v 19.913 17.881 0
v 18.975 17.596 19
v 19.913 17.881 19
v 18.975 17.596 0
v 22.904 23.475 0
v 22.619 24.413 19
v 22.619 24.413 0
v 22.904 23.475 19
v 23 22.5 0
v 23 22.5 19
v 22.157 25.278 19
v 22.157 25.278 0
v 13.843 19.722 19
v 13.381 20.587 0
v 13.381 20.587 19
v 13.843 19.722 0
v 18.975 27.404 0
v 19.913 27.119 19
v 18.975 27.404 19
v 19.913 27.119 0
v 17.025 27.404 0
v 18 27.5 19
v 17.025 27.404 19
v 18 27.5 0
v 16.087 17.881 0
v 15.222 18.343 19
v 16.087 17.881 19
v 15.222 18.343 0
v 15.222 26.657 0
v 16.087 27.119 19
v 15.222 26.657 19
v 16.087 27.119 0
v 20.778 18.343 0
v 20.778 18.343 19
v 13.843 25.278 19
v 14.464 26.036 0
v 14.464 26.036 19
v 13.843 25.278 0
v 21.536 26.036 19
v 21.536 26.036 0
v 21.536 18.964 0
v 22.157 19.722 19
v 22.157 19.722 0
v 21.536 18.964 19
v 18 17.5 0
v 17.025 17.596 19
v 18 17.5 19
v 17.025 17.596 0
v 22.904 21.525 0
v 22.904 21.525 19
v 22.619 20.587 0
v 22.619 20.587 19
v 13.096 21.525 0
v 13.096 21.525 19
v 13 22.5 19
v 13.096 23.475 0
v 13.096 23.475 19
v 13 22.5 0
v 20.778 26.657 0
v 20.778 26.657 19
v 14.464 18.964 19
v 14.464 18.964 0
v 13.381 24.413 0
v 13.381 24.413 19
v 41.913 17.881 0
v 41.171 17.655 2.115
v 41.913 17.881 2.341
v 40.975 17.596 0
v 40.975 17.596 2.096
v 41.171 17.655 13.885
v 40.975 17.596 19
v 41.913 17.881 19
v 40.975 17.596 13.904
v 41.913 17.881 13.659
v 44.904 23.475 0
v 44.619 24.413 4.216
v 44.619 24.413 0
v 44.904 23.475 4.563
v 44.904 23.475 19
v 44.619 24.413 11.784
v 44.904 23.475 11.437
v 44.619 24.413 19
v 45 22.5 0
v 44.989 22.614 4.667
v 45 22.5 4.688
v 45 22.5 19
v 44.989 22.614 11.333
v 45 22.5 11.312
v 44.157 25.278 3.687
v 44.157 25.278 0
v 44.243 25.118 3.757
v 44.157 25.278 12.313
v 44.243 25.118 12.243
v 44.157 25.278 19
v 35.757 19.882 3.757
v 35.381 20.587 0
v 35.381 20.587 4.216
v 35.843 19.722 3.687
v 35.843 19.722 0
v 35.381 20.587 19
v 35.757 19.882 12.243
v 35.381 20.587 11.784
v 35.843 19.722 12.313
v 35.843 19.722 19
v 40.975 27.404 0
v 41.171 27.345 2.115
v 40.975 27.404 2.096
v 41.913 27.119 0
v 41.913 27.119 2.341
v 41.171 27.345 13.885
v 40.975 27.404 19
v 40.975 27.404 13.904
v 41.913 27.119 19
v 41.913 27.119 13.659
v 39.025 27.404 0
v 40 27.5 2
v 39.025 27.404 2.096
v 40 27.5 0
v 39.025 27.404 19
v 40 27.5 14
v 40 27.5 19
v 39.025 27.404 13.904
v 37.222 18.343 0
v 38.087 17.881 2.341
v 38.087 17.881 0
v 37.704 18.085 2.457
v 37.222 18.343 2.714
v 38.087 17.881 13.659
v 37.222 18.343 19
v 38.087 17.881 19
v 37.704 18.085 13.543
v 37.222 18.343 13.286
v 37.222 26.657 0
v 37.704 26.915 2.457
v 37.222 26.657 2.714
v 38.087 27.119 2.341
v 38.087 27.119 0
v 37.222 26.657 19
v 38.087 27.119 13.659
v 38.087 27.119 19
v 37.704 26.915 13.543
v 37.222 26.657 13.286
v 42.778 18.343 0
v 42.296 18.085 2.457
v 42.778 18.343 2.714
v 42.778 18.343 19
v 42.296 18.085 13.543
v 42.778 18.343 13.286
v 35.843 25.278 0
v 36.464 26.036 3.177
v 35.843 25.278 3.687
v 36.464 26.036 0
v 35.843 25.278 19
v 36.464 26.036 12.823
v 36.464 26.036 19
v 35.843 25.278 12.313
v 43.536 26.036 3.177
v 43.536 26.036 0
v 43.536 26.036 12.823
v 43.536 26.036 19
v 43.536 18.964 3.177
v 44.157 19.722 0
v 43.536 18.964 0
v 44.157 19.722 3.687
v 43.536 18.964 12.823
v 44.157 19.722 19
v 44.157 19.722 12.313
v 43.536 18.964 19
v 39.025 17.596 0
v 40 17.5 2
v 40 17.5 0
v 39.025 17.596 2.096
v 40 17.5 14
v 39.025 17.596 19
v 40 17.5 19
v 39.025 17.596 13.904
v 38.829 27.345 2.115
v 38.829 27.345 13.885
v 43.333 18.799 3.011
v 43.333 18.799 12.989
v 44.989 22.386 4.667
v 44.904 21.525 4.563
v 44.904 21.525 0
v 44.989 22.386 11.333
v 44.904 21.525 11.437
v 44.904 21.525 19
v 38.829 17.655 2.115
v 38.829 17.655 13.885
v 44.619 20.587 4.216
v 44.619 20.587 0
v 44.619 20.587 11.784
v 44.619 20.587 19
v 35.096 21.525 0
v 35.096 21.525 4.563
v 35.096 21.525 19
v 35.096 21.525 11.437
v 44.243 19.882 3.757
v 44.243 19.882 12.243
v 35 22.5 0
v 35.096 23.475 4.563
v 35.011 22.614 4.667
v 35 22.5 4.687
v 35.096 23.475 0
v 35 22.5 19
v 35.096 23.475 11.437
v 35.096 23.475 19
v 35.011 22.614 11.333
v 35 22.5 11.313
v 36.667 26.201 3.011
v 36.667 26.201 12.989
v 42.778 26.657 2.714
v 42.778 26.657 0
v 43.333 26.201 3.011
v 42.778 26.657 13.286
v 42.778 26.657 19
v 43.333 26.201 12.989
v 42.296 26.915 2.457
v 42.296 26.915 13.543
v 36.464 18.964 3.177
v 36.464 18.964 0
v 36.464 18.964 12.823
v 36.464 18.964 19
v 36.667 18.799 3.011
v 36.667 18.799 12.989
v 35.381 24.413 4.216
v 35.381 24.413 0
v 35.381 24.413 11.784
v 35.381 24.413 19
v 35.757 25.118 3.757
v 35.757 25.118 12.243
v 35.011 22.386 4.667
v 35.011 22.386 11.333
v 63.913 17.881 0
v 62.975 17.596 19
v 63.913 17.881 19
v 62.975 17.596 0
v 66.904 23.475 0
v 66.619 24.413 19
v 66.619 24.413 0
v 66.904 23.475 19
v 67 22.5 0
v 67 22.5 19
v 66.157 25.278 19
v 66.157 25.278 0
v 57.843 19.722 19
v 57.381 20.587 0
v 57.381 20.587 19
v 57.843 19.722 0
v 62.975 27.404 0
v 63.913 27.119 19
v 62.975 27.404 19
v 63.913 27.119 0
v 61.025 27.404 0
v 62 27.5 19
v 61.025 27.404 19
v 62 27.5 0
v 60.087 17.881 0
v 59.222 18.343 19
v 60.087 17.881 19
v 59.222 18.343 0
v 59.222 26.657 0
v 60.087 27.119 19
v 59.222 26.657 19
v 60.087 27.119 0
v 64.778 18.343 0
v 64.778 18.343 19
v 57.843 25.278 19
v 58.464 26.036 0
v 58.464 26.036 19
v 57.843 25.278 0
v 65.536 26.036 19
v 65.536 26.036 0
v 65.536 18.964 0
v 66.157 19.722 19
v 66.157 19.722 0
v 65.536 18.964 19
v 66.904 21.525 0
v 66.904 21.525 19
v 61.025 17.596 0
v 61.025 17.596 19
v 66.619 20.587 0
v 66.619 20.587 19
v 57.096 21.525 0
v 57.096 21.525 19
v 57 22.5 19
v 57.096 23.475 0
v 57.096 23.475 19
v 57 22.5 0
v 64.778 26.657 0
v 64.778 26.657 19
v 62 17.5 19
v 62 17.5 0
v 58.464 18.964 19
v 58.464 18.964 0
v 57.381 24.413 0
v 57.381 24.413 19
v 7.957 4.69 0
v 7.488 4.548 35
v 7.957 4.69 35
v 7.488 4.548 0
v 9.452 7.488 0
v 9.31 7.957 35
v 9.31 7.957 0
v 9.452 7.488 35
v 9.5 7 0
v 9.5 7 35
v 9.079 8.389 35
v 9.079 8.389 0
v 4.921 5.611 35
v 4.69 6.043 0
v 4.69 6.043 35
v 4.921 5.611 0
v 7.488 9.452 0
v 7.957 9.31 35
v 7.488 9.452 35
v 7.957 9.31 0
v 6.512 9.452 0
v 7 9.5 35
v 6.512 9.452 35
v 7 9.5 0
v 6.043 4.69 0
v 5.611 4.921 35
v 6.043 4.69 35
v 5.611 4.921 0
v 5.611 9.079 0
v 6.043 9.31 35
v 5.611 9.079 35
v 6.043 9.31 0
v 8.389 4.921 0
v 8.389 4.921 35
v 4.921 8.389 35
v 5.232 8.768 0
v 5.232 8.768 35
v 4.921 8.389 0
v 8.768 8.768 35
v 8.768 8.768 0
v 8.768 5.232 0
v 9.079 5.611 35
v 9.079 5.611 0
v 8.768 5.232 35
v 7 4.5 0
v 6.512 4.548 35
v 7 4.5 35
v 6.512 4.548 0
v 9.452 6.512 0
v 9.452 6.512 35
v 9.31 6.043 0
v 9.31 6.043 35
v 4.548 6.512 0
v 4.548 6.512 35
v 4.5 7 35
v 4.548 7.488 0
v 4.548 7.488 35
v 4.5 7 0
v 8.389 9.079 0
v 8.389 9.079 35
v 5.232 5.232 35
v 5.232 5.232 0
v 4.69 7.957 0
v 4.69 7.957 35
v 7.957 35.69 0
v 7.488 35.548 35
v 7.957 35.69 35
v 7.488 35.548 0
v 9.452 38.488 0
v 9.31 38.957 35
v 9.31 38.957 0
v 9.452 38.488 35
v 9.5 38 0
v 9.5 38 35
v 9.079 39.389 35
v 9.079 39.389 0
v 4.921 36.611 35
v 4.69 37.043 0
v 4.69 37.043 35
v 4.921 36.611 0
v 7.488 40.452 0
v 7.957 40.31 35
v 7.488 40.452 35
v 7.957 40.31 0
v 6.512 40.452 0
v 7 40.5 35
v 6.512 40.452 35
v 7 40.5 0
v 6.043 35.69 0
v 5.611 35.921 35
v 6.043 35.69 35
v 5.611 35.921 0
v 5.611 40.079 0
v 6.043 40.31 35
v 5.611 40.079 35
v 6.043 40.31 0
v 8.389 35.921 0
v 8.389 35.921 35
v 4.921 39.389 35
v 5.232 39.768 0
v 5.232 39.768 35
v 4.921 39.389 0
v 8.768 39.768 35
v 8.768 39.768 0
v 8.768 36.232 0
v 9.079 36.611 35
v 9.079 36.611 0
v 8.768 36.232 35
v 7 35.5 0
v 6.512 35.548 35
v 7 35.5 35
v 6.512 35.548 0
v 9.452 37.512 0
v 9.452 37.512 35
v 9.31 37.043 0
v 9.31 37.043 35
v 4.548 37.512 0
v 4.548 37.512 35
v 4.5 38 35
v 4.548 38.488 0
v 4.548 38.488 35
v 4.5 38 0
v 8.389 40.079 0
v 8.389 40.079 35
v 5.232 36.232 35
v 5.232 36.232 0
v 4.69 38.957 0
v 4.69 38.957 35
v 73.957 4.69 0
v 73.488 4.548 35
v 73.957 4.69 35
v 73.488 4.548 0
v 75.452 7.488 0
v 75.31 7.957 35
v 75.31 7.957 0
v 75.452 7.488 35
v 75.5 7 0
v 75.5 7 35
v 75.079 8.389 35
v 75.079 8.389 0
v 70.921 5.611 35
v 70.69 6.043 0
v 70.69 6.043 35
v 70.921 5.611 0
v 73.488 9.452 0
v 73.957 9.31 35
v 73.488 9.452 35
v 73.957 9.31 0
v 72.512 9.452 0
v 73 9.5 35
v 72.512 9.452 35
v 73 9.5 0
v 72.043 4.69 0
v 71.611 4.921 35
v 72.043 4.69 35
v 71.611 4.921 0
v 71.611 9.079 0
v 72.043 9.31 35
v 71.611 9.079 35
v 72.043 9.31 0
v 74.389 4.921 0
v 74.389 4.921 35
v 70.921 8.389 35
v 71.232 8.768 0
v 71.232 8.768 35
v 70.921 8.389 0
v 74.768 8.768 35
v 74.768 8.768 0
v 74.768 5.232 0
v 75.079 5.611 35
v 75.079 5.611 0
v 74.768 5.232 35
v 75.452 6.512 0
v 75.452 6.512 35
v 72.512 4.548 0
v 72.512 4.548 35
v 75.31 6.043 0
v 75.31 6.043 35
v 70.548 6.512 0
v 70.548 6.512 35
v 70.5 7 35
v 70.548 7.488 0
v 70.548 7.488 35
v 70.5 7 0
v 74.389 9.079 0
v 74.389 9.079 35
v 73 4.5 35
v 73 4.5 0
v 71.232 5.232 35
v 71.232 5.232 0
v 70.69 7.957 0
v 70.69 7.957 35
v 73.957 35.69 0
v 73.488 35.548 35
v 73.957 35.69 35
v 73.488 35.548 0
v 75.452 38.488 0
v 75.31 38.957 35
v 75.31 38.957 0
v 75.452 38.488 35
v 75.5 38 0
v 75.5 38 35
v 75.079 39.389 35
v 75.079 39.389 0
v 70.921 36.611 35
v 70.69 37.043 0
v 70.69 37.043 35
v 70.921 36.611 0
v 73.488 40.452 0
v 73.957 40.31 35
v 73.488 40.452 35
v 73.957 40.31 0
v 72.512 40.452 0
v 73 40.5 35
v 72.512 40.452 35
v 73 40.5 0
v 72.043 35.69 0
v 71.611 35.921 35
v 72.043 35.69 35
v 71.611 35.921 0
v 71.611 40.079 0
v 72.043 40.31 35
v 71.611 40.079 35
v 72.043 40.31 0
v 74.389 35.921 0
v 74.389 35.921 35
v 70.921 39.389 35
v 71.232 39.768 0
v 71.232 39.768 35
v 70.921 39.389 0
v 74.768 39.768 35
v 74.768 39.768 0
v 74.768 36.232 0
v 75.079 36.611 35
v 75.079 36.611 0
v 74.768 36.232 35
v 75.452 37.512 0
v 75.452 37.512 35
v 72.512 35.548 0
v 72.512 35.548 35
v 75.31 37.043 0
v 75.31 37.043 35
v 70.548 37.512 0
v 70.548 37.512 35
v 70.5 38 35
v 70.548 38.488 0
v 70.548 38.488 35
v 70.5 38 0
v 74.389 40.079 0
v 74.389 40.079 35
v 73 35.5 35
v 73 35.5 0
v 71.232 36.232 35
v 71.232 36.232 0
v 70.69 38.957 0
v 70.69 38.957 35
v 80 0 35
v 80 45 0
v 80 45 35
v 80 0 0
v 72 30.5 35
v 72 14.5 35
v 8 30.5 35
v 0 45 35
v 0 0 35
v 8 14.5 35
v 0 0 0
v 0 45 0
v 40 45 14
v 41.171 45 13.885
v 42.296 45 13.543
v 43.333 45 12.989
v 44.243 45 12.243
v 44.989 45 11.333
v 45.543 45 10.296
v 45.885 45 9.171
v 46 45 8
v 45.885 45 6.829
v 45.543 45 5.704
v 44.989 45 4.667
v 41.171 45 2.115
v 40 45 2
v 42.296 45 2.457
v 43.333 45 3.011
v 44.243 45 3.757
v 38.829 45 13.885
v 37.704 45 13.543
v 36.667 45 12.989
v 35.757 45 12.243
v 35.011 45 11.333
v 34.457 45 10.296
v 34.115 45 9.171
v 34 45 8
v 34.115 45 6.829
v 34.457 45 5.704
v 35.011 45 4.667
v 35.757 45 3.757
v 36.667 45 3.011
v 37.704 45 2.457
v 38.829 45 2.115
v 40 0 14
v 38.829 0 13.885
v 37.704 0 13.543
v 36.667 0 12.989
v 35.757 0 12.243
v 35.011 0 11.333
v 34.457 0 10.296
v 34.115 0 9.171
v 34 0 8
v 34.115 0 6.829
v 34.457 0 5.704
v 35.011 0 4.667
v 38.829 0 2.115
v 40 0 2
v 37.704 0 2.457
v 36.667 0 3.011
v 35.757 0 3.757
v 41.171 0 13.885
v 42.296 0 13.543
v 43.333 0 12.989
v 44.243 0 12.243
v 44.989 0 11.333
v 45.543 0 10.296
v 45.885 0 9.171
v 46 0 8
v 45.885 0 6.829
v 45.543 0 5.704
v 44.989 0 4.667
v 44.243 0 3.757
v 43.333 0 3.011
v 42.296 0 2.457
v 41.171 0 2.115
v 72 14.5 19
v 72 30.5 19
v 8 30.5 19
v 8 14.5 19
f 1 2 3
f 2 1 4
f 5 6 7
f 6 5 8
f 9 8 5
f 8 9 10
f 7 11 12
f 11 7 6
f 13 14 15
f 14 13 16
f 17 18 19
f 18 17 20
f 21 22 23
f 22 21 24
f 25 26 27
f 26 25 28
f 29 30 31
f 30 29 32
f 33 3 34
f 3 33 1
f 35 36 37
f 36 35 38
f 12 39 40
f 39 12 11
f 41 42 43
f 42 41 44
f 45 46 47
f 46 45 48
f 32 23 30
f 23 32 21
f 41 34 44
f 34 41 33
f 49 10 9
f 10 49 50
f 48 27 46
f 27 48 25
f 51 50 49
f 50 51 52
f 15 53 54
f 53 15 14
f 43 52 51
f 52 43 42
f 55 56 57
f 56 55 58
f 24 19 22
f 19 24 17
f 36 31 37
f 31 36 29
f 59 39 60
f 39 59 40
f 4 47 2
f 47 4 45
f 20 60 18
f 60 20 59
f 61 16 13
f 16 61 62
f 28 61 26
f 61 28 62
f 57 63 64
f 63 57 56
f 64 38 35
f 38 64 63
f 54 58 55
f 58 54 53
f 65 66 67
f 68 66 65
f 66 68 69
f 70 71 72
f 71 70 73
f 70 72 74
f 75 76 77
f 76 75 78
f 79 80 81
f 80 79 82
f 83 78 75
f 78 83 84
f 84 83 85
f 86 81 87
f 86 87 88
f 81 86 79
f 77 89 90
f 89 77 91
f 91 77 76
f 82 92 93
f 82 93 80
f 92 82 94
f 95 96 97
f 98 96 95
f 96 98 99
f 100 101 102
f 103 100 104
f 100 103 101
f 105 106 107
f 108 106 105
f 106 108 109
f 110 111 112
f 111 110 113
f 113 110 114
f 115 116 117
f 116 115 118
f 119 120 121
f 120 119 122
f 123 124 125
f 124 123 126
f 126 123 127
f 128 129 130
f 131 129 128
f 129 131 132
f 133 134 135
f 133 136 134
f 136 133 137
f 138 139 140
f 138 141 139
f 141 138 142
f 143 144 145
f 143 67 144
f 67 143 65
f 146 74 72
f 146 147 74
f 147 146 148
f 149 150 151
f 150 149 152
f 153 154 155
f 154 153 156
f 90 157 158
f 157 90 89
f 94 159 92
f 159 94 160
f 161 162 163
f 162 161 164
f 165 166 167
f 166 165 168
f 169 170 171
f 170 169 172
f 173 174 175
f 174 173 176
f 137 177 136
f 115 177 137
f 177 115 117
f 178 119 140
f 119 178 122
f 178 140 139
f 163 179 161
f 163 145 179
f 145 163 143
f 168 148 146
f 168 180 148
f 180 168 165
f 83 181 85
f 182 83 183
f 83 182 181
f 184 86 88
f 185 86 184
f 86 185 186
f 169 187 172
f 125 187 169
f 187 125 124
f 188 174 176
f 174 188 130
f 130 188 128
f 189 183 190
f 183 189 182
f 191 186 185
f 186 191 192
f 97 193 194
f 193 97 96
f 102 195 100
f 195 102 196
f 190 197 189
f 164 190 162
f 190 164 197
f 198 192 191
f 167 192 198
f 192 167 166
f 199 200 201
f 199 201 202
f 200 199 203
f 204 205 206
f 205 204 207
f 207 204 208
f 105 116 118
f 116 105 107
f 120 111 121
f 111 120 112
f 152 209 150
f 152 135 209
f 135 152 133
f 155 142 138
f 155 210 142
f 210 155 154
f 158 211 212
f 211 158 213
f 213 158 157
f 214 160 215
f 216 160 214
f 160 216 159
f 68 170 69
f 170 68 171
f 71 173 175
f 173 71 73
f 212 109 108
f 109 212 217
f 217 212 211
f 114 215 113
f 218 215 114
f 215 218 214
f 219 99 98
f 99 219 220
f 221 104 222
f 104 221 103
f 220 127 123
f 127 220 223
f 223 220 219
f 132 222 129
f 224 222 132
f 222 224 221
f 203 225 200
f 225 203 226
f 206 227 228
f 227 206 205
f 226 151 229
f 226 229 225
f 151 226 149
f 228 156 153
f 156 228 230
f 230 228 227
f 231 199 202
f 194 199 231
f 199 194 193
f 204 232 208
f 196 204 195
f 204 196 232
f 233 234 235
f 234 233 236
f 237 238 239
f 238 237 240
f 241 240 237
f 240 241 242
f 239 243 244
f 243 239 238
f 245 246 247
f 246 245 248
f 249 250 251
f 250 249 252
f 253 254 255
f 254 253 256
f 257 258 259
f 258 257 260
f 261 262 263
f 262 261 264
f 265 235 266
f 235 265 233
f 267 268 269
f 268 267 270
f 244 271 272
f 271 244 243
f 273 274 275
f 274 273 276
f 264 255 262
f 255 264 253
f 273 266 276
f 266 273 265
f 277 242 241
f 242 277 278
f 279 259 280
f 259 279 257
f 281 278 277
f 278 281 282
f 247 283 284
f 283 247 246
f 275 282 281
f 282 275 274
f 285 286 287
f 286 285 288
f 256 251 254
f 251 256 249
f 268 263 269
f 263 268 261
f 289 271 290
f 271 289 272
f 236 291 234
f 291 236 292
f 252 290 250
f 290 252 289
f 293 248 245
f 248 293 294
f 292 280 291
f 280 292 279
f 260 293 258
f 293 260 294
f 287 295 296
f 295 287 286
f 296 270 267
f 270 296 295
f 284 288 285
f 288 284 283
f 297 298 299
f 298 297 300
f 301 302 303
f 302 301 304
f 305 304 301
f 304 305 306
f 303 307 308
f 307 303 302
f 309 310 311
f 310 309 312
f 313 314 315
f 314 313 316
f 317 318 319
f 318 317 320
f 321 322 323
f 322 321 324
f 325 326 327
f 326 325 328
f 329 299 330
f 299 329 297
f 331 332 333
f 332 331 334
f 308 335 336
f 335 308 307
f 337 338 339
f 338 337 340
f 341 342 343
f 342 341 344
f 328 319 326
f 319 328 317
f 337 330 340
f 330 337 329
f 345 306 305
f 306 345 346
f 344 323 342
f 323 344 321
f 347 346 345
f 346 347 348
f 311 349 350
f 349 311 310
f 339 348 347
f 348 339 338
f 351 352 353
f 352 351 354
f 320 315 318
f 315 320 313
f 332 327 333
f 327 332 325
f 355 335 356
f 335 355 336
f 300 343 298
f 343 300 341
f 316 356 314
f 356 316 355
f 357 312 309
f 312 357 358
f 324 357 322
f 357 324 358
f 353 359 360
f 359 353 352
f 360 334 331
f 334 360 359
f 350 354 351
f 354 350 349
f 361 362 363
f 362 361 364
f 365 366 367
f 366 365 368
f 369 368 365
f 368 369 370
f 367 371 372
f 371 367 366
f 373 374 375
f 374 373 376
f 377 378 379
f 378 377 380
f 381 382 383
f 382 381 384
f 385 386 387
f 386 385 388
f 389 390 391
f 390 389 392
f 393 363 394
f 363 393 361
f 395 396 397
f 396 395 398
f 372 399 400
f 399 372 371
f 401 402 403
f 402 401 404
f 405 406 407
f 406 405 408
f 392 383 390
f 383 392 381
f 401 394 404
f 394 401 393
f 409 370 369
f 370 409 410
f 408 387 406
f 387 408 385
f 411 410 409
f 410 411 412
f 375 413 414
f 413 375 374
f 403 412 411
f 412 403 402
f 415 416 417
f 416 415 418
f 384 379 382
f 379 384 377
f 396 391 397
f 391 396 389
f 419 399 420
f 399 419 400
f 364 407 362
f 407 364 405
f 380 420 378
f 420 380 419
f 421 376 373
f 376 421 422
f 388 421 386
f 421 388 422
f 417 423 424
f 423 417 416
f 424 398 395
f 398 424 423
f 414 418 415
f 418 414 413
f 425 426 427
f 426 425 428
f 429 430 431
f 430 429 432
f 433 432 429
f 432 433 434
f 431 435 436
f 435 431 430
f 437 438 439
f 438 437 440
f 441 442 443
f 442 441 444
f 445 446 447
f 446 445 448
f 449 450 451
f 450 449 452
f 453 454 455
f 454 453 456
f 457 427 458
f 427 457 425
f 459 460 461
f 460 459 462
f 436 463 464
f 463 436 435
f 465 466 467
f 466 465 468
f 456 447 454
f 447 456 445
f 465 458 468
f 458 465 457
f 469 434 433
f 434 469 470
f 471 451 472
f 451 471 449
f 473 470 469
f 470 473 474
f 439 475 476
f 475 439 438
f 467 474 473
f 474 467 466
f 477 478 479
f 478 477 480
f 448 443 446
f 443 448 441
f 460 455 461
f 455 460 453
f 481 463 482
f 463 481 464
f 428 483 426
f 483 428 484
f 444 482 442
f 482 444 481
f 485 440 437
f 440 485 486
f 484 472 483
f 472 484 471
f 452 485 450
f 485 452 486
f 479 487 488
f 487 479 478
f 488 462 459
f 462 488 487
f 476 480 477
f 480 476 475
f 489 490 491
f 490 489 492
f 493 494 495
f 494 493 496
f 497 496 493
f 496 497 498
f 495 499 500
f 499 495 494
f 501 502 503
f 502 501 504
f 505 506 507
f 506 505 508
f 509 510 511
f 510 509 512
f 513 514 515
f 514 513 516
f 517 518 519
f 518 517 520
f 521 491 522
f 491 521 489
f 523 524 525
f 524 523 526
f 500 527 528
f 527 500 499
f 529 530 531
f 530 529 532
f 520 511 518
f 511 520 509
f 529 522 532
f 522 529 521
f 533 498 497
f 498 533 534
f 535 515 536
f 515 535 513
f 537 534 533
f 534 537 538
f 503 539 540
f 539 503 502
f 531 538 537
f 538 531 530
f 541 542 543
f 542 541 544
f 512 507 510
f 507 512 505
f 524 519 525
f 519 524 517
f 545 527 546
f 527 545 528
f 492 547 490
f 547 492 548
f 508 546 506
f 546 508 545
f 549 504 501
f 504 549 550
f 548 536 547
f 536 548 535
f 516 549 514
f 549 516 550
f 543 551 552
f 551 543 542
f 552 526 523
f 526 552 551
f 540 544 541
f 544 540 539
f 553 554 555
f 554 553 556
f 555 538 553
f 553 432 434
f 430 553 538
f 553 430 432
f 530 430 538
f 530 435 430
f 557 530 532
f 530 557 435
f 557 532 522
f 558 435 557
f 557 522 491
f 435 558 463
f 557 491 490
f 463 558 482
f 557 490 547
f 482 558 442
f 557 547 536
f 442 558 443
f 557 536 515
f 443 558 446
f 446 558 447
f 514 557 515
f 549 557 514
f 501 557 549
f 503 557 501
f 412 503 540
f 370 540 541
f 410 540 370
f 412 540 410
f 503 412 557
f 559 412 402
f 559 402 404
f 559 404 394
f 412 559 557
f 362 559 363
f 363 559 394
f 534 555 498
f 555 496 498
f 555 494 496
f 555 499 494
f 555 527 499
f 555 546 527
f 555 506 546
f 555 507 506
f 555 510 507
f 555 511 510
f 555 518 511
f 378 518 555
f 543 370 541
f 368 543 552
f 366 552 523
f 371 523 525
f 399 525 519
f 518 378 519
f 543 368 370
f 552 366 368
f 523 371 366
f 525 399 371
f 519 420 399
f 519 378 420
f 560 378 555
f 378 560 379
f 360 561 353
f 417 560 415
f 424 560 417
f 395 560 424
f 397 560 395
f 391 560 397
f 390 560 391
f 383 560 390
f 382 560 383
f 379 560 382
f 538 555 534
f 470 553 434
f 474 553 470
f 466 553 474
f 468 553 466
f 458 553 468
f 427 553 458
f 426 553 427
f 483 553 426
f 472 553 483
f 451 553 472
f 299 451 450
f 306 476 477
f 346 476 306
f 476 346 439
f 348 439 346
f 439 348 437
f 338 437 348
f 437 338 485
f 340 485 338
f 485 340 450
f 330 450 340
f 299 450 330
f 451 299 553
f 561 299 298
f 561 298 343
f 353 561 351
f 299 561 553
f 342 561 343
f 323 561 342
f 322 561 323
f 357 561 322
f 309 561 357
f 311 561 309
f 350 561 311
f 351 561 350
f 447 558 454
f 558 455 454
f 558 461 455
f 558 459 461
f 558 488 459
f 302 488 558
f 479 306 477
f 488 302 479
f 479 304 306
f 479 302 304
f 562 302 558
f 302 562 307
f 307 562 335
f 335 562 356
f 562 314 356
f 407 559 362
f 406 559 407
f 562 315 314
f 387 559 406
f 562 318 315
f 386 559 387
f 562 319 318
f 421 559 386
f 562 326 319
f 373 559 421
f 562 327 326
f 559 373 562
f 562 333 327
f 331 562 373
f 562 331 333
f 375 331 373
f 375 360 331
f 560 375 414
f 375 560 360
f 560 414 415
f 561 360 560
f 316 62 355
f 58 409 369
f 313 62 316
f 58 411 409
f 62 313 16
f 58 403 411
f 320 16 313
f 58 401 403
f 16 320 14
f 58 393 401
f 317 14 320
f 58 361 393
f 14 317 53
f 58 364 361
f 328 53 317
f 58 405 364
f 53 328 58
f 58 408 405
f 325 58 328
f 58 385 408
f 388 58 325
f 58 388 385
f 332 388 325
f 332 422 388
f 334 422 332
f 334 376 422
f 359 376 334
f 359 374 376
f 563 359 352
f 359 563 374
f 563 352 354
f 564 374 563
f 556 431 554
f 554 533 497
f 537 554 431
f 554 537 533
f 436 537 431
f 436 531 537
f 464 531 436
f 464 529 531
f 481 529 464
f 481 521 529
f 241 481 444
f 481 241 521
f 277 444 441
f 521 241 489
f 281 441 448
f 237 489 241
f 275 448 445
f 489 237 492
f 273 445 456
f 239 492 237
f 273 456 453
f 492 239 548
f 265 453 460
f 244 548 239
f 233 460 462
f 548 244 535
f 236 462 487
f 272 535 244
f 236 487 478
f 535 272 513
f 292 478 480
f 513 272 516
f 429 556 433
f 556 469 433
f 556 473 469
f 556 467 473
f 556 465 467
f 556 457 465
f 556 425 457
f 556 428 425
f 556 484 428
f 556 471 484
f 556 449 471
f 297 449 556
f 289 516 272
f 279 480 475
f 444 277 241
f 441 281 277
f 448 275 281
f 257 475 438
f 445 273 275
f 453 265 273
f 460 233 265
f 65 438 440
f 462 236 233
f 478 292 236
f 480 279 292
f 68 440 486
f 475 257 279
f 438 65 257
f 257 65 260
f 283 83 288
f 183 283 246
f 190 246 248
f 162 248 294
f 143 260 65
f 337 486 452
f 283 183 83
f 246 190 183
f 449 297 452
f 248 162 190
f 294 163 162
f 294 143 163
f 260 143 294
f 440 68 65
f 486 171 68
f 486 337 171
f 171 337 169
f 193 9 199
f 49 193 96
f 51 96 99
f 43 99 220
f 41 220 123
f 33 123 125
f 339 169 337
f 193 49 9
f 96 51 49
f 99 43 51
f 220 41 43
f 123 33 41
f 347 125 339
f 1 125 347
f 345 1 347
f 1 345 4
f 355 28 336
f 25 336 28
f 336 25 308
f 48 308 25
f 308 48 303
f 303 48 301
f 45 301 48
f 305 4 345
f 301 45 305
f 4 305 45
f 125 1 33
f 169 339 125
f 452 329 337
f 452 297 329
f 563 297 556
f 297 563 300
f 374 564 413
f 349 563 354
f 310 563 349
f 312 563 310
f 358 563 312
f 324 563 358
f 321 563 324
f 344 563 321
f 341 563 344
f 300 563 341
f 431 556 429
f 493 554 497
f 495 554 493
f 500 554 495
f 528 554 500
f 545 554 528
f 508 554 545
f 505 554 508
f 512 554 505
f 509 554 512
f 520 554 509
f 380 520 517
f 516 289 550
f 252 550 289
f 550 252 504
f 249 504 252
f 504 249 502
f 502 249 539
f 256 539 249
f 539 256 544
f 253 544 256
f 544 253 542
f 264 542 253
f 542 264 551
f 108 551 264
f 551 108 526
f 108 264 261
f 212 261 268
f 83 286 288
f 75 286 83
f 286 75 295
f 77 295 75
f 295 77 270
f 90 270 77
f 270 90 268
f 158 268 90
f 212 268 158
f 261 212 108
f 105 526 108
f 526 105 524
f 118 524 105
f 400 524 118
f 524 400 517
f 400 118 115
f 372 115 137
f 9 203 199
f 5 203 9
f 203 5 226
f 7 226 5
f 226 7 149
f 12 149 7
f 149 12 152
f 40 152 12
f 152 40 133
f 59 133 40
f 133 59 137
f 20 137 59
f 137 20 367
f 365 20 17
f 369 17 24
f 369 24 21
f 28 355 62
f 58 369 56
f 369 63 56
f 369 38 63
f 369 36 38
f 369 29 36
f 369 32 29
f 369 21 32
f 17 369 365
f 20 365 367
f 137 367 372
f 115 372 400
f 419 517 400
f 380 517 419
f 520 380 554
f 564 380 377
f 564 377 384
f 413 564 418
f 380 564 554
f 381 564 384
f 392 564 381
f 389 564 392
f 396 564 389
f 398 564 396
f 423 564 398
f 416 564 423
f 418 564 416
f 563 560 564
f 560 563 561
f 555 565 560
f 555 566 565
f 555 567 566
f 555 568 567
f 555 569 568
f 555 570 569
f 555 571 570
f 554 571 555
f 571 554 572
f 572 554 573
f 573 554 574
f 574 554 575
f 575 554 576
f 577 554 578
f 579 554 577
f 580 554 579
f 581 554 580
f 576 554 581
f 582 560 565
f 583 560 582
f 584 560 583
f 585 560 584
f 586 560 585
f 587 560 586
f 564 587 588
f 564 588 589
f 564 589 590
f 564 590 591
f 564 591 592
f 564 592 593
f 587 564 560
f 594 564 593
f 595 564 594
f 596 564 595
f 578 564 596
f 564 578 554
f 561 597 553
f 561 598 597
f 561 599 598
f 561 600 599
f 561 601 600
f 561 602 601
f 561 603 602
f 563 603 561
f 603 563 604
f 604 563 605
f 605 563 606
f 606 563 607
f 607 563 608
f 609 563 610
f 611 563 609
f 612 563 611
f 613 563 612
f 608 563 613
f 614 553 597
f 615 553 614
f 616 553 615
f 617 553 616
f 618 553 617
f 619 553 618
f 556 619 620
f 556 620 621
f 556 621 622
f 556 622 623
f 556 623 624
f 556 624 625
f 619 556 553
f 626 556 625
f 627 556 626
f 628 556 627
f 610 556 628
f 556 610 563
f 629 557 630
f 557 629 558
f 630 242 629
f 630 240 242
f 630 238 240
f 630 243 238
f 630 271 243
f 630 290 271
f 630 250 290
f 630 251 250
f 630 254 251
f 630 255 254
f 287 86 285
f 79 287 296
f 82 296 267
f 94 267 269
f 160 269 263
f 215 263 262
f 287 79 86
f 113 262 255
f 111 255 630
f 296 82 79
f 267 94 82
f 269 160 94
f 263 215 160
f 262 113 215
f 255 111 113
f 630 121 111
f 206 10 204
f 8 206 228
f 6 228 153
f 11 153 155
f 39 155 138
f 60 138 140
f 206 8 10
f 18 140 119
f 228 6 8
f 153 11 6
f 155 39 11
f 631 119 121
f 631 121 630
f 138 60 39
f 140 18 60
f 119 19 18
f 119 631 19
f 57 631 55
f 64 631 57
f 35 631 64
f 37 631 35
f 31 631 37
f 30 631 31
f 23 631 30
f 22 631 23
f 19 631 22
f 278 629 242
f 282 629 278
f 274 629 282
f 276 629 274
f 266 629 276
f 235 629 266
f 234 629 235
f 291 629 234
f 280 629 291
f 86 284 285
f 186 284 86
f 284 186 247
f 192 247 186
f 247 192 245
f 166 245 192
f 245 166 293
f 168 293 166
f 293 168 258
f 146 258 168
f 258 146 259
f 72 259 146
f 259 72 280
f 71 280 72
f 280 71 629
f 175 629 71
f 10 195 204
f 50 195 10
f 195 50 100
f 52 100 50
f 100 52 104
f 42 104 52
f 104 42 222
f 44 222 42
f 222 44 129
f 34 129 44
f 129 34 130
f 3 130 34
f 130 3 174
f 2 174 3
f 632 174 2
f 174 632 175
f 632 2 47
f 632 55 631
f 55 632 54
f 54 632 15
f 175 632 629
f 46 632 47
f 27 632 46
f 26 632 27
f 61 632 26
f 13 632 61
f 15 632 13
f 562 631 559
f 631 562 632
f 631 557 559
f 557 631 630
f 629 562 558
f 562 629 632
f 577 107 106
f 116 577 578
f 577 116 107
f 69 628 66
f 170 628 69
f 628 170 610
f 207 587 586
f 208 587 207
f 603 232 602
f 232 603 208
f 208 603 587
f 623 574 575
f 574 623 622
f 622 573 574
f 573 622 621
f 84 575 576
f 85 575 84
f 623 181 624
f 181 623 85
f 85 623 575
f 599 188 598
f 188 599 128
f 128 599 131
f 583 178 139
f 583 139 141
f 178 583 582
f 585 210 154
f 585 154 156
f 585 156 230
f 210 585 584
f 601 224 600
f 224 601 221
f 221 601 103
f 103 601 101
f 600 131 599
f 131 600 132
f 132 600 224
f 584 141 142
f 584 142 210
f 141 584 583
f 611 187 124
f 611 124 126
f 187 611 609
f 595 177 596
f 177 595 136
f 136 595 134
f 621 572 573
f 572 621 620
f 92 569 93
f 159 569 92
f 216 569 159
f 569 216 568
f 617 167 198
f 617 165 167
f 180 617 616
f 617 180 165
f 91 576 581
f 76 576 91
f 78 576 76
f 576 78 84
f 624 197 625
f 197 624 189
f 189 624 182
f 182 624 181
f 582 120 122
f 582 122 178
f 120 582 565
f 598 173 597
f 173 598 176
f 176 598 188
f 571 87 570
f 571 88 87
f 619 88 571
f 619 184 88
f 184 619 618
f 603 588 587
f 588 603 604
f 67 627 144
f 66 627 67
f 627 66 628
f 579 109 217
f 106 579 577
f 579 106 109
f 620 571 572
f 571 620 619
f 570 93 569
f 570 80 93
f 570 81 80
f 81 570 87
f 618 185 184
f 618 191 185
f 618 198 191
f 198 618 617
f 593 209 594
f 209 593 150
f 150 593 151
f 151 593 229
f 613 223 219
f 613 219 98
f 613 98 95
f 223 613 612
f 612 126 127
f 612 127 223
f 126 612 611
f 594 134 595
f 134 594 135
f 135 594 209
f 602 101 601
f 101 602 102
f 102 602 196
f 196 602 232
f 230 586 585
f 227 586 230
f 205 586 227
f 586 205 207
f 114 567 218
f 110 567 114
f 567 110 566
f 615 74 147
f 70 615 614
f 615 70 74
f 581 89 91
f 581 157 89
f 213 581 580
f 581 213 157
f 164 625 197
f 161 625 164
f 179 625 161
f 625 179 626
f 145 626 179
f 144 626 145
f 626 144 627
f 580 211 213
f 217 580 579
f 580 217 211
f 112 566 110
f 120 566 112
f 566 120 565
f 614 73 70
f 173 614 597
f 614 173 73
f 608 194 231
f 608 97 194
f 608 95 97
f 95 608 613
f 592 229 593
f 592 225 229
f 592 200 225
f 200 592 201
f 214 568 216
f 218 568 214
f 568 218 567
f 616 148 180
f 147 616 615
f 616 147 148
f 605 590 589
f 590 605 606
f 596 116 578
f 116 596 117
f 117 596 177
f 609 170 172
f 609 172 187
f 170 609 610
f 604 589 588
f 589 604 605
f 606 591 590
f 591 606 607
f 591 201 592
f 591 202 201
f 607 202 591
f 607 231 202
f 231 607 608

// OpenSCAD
$fn = 32;

// ----------------------------------------------------------------------
// Manifold block: side_outlet manifold
// ----------------------------------------------------------------------

// --- parameters (mm) ---
block_l = 80;             // block length, X
block_w = 45;             // block width, Y
block_h = 35;             // block height, Z
port_d = 10;              // port bore diameter
port_pitch = 22;          // port pitch along X
gallery_d = 16;           // top gallery width, Y
gallery_depth = 16;       // gallery pocket depth
wall_p = 8;               // gallery end wall thickness, X
mnt_d = 5;                // mounting hole diameter
mnt_in = 7;               // mounting hole inset from the edges
out_d = 12;               // outlet bore diameter
out_z = 8;                // outlet axis height

n_ports = 3;  // ports in the row
port_x0 = (block_l - (n_ports - 1) * port_pitch) / 2;  // first port X

difference() {
  cube([block_l, block_w, block_h]);
  for (i = [0 : n_ports - 1])
    translate([port_x0 + i * port_pitch, block_w / 2, -1])
      cylinder(h = block_h + 2, d = port_d);
  translate([wall_p, block_w / 2 - gallery_d / 2, block_h - gallery_depth])
    cube([block_l - 2 * wall_p, gallery_d, gallery_depth + 1]);
  for (cx = [mnt_in, block_l - mnt_in])
    for (cy = [mnt_in, block_w - mnt_in])
      translate([cx, cy, -1]) cylinder(h = block_h + 2, d = mnt_d);
  translate([block_l / 2, -1, out_z]) rotate([-90, 0, 0])
    cylinder(h = block_w + 2, d = out_d);
}
